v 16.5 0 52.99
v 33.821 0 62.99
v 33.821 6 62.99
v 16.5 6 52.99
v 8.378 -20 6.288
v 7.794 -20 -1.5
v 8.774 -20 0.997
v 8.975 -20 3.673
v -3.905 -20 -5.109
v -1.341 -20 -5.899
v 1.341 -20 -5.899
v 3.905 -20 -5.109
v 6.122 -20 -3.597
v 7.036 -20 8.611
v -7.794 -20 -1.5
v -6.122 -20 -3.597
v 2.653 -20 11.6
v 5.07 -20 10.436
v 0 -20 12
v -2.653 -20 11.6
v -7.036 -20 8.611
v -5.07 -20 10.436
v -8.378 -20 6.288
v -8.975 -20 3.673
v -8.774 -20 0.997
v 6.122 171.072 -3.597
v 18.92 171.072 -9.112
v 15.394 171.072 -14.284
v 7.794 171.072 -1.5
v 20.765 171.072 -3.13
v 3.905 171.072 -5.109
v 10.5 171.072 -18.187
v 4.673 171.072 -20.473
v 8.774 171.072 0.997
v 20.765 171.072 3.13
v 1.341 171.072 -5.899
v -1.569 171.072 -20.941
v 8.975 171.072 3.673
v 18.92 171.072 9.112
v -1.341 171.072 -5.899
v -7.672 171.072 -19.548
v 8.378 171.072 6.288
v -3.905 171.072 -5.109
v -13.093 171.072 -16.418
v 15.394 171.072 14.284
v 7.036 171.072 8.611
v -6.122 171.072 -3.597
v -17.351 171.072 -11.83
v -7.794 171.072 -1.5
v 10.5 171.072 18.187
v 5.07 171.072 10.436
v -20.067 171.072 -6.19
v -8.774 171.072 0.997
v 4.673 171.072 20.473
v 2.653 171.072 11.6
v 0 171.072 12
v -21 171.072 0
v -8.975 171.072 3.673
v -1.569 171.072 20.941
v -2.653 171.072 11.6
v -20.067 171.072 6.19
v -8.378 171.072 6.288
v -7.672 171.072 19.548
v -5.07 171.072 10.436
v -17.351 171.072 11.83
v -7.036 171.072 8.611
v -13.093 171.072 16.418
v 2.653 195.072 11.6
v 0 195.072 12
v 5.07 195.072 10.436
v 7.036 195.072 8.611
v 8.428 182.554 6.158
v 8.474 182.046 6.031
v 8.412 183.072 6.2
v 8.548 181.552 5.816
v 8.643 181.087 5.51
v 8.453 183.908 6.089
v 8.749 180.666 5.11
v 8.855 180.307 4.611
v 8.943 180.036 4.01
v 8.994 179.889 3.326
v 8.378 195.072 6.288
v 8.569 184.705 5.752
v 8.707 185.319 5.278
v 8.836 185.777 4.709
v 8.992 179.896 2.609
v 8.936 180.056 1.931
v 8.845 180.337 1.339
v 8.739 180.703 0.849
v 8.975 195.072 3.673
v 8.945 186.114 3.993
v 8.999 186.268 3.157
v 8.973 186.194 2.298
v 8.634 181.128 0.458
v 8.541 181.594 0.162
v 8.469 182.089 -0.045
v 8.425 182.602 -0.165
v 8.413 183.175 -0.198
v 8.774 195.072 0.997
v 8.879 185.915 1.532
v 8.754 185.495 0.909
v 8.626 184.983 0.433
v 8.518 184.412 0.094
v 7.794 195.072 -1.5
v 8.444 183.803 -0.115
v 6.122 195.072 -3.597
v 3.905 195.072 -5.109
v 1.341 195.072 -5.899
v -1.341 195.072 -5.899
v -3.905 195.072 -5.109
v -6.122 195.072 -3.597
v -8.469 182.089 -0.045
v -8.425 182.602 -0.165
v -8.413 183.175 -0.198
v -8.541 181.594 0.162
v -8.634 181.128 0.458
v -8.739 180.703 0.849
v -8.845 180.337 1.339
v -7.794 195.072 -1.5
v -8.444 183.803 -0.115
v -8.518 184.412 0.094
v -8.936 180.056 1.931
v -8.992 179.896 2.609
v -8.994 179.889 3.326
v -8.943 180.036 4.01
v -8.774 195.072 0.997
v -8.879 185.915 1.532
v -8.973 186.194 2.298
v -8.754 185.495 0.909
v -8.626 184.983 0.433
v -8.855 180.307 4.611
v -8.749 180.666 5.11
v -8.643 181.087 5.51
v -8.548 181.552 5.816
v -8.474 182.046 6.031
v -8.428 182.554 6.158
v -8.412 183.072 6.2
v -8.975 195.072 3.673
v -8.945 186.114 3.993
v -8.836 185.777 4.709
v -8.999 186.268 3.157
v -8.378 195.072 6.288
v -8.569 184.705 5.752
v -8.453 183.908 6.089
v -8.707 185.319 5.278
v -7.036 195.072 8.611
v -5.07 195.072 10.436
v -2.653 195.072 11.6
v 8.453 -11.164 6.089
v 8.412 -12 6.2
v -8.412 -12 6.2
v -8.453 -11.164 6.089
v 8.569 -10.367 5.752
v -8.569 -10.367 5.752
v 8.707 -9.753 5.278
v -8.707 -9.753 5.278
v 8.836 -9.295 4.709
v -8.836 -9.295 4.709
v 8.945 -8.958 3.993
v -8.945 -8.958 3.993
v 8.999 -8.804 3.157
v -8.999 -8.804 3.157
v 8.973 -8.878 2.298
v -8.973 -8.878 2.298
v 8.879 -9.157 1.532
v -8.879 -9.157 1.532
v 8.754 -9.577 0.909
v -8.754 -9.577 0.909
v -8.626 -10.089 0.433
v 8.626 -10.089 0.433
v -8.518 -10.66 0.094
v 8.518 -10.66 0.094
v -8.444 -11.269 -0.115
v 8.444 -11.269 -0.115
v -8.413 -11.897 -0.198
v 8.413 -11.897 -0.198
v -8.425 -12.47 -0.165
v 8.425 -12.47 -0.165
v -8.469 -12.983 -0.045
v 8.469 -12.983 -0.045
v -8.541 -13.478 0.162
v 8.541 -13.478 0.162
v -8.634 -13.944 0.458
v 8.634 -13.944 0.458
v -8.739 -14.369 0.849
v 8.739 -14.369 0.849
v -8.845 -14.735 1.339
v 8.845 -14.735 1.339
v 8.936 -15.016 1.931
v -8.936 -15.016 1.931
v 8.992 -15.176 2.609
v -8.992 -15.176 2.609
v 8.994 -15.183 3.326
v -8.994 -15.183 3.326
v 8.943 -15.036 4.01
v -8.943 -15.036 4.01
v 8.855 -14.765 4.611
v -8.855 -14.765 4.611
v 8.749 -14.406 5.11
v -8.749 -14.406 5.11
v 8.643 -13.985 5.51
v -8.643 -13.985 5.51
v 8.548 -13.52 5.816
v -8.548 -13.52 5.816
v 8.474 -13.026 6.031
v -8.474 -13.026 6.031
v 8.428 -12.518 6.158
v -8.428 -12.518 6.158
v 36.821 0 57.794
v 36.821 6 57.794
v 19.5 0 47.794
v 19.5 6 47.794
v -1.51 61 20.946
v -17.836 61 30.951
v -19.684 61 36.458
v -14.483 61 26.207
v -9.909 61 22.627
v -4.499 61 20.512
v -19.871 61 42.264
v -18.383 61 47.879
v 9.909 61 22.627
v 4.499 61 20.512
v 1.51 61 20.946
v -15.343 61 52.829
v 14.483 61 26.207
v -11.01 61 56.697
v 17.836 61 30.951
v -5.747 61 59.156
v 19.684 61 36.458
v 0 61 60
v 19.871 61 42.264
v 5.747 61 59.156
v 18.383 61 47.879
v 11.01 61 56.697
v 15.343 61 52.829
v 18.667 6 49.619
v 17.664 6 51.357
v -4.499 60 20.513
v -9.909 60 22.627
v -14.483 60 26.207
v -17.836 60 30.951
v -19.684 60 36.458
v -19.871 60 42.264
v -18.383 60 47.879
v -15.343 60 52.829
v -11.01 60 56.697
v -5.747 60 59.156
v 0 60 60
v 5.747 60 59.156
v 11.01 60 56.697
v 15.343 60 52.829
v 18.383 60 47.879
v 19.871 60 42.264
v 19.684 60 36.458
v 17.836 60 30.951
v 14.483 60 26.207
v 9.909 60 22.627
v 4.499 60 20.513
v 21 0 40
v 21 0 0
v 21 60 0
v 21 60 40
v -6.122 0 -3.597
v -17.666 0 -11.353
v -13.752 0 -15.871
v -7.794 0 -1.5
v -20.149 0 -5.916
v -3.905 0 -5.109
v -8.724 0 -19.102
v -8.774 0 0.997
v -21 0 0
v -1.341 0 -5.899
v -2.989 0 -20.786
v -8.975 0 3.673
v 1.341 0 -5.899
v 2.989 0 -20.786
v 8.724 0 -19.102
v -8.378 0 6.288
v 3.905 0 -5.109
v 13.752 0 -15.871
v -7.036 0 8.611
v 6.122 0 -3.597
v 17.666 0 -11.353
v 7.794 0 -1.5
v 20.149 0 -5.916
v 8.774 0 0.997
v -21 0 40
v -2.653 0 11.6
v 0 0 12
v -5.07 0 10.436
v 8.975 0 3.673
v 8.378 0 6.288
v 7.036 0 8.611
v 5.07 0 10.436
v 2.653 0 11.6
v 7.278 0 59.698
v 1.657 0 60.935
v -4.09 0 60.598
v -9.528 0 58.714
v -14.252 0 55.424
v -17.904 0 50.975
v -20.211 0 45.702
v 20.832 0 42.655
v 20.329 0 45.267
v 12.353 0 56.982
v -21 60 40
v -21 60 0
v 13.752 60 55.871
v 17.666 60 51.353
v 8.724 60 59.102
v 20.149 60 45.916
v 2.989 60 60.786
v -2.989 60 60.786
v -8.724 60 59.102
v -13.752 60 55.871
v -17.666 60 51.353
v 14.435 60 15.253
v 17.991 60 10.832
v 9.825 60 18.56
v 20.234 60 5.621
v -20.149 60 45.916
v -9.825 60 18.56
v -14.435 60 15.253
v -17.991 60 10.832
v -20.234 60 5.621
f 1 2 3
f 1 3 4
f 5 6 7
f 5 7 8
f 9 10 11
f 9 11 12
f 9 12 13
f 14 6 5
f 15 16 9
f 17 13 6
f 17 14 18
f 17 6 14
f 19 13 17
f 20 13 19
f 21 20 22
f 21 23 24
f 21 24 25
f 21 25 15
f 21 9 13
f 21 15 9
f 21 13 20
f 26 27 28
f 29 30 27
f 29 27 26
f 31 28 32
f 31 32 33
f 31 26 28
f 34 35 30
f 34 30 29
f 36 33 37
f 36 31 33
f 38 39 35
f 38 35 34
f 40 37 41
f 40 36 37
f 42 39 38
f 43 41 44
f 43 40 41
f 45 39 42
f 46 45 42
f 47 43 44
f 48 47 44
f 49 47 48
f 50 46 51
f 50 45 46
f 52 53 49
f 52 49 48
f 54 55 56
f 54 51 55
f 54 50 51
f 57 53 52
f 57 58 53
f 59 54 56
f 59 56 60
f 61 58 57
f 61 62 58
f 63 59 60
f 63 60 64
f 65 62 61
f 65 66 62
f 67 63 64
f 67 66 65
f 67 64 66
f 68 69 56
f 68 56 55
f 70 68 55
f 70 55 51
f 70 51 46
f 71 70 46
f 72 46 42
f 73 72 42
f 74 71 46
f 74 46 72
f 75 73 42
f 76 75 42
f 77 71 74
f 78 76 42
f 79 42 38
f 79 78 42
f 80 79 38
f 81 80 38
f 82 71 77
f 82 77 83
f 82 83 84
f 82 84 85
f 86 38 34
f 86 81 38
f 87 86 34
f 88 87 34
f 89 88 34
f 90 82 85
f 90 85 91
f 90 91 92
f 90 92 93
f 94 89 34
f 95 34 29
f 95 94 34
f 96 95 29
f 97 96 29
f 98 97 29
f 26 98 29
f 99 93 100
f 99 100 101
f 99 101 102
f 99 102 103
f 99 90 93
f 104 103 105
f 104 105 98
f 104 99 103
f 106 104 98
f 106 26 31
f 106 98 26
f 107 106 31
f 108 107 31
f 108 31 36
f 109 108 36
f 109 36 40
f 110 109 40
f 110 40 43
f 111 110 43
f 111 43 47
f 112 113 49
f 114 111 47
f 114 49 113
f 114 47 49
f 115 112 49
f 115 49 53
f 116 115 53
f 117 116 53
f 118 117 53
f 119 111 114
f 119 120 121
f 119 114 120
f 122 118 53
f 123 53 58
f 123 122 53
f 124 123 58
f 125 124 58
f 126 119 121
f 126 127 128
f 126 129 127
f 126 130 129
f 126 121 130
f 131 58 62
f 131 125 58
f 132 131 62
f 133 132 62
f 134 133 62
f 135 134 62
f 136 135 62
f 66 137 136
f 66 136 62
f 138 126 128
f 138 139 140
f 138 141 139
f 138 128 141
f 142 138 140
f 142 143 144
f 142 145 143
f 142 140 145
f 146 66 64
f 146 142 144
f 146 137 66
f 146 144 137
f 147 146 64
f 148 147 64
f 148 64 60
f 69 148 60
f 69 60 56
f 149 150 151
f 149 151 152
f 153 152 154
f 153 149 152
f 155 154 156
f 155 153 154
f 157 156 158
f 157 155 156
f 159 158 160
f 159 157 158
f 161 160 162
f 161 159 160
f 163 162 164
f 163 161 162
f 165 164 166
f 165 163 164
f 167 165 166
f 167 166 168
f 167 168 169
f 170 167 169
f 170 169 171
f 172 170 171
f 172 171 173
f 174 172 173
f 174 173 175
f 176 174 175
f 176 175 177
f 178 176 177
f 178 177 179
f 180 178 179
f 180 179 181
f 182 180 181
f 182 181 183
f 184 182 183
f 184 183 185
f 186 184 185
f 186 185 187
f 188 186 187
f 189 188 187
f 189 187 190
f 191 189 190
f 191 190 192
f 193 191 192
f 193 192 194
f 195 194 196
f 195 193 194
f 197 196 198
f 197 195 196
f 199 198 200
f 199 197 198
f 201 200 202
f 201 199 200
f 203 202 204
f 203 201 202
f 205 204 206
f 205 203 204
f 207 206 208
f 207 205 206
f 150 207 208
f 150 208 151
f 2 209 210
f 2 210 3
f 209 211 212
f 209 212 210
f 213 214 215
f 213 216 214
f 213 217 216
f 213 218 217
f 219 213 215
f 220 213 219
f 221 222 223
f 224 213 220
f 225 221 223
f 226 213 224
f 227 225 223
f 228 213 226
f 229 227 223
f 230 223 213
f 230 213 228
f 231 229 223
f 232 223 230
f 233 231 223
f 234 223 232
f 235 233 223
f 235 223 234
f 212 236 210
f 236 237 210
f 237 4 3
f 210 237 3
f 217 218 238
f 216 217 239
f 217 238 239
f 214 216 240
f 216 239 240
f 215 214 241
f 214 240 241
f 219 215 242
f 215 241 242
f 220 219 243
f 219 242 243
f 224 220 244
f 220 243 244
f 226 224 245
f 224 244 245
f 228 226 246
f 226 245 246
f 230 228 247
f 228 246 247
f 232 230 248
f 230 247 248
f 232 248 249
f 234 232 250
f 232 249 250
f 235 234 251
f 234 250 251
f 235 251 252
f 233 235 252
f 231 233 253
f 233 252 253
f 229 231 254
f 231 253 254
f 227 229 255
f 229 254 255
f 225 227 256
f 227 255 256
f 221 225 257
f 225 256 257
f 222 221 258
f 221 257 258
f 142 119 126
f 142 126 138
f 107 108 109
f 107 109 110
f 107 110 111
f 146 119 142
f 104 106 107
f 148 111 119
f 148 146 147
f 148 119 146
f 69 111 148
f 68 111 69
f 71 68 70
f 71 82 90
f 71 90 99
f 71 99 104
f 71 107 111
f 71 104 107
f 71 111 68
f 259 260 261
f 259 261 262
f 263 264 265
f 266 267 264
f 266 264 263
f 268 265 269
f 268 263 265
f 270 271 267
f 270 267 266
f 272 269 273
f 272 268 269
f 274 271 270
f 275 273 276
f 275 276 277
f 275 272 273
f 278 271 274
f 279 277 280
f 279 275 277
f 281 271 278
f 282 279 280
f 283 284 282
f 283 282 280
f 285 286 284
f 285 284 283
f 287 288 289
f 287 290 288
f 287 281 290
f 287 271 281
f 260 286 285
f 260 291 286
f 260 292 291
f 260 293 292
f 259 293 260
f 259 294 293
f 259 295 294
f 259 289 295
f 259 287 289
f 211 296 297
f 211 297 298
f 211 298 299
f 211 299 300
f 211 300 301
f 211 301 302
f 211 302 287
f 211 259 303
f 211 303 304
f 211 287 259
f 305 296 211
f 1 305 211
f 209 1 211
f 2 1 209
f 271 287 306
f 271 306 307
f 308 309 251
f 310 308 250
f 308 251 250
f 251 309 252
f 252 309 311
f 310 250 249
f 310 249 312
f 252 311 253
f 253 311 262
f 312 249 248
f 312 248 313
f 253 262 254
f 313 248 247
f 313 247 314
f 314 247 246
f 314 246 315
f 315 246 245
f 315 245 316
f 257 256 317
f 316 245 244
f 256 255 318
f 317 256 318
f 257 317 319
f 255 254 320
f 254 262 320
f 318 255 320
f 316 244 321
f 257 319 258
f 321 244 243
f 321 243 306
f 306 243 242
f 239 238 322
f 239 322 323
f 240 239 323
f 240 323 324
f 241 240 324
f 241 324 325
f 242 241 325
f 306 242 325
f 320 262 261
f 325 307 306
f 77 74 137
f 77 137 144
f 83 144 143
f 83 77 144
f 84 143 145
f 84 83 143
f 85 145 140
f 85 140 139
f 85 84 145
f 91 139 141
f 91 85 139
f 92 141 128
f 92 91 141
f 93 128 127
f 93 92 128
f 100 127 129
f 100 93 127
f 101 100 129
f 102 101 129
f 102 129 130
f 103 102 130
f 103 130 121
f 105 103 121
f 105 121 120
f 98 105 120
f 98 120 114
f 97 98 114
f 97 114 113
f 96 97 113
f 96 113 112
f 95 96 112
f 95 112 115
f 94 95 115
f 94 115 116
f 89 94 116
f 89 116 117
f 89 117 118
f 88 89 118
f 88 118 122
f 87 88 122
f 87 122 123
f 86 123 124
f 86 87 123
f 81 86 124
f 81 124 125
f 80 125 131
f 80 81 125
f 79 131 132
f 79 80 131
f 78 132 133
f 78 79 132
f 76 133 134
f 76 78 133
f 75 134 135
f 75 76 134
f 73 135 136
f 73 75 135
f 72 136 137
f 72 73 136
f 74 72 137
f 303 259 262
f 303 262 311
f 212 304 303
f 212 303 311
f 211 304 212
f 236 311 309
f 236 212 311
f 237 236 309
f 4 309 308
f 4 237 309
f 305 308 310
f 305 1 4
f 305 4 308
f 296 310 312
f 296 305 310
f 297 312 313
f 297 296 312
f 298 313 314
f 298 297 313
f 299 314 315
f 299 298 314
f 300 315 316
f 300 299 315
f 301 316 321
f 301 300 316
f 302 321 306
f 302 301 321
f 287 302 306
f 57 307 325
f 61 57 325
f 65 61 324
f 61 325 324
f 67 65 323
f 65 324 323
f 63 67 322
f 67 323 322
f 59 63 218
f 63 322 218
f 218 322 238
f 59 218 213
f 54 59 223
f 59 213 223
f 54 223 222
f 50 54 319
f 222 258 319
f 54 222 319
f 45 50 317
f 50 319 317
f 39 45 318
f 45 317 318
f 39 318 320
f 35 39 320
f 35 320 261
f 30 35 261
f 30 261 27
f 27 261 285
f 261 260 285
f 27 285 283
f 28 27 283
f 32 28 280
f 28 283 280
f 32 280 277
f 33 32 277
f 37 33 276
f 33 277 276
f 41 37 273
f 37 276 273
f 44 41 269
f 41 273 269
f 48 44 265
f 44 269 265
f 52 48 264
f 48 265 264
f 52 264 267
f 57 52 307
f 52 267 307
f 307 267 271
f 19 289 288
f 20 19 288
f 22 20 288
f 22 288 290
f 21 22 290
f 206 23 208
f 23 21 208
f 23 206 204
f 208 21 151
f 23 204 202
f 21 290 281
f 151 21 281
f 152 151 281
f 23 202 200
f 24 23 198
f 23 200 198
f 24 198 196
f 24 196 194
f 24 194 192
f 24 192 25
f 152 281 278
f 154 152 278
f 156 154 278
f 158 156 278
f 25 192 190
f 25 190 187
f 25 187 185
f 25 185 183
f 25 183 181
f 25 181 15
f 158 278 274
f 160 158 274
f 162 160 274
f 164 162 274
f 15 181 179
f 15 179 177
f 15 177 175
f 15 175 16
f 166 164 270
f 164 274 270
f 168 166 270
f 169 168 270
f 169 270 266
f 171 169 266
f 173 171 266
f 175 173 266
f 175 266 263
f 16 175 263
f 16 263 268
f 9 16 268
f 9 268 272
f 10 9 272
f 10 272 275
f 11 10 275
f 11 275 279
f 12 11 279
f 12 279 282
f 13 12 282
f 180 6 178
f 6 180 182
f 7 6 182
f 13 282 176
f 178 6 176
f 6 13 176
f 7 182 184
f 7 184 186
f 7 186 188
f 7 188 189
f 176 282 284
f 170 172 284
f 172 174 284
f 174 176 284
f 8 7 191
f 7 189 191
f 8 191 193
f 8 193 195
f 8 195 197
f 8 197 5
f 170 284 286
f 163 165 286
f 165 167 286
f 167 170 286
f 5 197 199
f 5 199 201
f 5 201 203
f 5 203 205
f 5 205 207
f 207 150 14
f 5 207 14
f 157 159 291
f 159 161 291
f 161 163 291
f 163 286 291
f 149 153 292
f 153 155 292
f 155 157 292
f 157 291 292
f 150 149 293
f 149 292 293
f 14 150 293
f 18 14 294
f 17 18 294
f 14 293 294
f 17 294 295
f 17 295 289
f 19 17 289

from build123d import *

# Parameters (mm, degrees)
BOSS_EXTRUDE1_DEPTH     = 60
SKETCH2_R               = 20
BOSS_EXTRUDE2_DEPTH     = 1
SKETCH3_R               = 21
BOSS_EXTRUDE3_DEPTH     = 111.072
SKETCH4_R               = 9
BOSS_EXTRUDE4_DEPTH     = 20
CUT_EXTRUDE1_DEPTH      = 187.415206418
CUT_EXTRUDE1_DEPTH_BACK = 187.415206418
SKETCH5_R               = 3.2
BOSS_EXTRUDE5_START     = 24
SKETCH6_R               = 9
BOSS_EXTRUDE5_DEPTH     = 24
CUT_EXTRUDE2_DEPTH      = 209.657818411
CUT_EXTRUDE2_DEPTH_BACK = 209.657818411
SKETCH7_R               = 3.2
BOSS_EXTRUDE6_DEPTH     = 6


with BuildPart() as part:
    # Sketch1 → Boss-Extrude1 (new body)
    with BuildSketch(Plane(origin=(0, 0, 0), x_dir=(1, 0, 0), z_dir=(0, 1, 0))):
        with BuildLine():
            Line((21, 0), (21, -40))
            ThreePointArc((21, -40), (0, -61), (-21, -40))
            Line((-21, -40), (-21, 0))
            ThreePointArc((-21, 0), (0, 21), (21, 0))
        make_face()
    extrude(amount=BOSS_EXTRUDE1_DEPTH)

    # Sketch2 → Boss-Extrude2 (add)
    with BuildSketch(Plane(origin=(0, 60, 0), x_dir=(1, 0, 0), z_dir=(0, 1, 0))):
        with Locations(Location((0, -40, 0), (0, 0, 270))):
            Circle(SKETCH2_R)
    extrude(amount=BOSS_EXTRUDE2_DEPTH)

    # Sketch3 → Boss-Extrude3 (add)
    with BuildSketch(Plane(origin=(0, 60, 0), x_dir=(1, 0, 0), z_dir=(0, 1, 0))):
        with Locations(Location((0, 0, 0), (0, 0, 180))):
            Circle(SKETCH3_R)
    extrude(amount=BOSS_EXTRUDE3_DEPTH)

    # Sketch4 → Boss-Extrude4 (add)
    with BuildSketch(Plane.XZ):
        with Locations(Location((0, 3, 0), (0, 0, 90))):
            Circle(SKETCH4_R)
    extrude(amount=BOSS_EXTRUDE4_DEPTH)

    # Sketch5 → Cut-Extrude1 (cut, two sides: drawn at the far end of the back side and taken through both)
    with BuildSketch(Plane.ZY.offset(21).offset(-CUT_EXTRUDE1_DEPTH_BACK)):
        with Locations((3, -12)):
            Circle(SKETCH5_R)
    extrude(amount=CUT_EXTRUDE1_DEPTH + CUT_EXTRUDE1_DEPTH_BACK, mode=Mode.SUBTRACT)

    # Sketch6 → Boss-Extrude5 (add)
    with BuildSketch(Plane(origin=(0, 171.072, 0), x_dir=(1, 0, 0), z_dir=(0, 1, 0)).offset(BOSS_EXTRUDE5_START)):
        with Locations(Location((0, -3, 0), (0, 0, 270))):
            Circle(SKETCH6_R)
    extrude(amount=-BOSS_EXTRUDE5_DEPTH)

    # Sketch7 → Cut-Extrude2 (cut, two sides: drawn at the far end of the back side and taken through both)
    with BuildSketch(Plane.ZY.offset(21).offset(-CUT_EXTRUDE2_DEPTH_BACK)):
        with Locations((3, 183.072)):
            Circle(SKETCH7_R)
    extrude(amount=CUT_EXTRUDE2_DEPTH + CUT_EXTRUDE2_DEPTH_BACK, mode=Mode.SUBTRACT)

    # Sketch8 → Boss-Extrude6 (add)
    with BuildSketch(Plane.XZ):
        Polygon((19.5, 47.794228634), (36.820508076, 57.794228634), (33.820508076, 62.990381057), (16.5, 52.990381057), align=None)
    extrude(amount=-BOSS_EXTRUDE6_DEPTH)


solid = part.part
